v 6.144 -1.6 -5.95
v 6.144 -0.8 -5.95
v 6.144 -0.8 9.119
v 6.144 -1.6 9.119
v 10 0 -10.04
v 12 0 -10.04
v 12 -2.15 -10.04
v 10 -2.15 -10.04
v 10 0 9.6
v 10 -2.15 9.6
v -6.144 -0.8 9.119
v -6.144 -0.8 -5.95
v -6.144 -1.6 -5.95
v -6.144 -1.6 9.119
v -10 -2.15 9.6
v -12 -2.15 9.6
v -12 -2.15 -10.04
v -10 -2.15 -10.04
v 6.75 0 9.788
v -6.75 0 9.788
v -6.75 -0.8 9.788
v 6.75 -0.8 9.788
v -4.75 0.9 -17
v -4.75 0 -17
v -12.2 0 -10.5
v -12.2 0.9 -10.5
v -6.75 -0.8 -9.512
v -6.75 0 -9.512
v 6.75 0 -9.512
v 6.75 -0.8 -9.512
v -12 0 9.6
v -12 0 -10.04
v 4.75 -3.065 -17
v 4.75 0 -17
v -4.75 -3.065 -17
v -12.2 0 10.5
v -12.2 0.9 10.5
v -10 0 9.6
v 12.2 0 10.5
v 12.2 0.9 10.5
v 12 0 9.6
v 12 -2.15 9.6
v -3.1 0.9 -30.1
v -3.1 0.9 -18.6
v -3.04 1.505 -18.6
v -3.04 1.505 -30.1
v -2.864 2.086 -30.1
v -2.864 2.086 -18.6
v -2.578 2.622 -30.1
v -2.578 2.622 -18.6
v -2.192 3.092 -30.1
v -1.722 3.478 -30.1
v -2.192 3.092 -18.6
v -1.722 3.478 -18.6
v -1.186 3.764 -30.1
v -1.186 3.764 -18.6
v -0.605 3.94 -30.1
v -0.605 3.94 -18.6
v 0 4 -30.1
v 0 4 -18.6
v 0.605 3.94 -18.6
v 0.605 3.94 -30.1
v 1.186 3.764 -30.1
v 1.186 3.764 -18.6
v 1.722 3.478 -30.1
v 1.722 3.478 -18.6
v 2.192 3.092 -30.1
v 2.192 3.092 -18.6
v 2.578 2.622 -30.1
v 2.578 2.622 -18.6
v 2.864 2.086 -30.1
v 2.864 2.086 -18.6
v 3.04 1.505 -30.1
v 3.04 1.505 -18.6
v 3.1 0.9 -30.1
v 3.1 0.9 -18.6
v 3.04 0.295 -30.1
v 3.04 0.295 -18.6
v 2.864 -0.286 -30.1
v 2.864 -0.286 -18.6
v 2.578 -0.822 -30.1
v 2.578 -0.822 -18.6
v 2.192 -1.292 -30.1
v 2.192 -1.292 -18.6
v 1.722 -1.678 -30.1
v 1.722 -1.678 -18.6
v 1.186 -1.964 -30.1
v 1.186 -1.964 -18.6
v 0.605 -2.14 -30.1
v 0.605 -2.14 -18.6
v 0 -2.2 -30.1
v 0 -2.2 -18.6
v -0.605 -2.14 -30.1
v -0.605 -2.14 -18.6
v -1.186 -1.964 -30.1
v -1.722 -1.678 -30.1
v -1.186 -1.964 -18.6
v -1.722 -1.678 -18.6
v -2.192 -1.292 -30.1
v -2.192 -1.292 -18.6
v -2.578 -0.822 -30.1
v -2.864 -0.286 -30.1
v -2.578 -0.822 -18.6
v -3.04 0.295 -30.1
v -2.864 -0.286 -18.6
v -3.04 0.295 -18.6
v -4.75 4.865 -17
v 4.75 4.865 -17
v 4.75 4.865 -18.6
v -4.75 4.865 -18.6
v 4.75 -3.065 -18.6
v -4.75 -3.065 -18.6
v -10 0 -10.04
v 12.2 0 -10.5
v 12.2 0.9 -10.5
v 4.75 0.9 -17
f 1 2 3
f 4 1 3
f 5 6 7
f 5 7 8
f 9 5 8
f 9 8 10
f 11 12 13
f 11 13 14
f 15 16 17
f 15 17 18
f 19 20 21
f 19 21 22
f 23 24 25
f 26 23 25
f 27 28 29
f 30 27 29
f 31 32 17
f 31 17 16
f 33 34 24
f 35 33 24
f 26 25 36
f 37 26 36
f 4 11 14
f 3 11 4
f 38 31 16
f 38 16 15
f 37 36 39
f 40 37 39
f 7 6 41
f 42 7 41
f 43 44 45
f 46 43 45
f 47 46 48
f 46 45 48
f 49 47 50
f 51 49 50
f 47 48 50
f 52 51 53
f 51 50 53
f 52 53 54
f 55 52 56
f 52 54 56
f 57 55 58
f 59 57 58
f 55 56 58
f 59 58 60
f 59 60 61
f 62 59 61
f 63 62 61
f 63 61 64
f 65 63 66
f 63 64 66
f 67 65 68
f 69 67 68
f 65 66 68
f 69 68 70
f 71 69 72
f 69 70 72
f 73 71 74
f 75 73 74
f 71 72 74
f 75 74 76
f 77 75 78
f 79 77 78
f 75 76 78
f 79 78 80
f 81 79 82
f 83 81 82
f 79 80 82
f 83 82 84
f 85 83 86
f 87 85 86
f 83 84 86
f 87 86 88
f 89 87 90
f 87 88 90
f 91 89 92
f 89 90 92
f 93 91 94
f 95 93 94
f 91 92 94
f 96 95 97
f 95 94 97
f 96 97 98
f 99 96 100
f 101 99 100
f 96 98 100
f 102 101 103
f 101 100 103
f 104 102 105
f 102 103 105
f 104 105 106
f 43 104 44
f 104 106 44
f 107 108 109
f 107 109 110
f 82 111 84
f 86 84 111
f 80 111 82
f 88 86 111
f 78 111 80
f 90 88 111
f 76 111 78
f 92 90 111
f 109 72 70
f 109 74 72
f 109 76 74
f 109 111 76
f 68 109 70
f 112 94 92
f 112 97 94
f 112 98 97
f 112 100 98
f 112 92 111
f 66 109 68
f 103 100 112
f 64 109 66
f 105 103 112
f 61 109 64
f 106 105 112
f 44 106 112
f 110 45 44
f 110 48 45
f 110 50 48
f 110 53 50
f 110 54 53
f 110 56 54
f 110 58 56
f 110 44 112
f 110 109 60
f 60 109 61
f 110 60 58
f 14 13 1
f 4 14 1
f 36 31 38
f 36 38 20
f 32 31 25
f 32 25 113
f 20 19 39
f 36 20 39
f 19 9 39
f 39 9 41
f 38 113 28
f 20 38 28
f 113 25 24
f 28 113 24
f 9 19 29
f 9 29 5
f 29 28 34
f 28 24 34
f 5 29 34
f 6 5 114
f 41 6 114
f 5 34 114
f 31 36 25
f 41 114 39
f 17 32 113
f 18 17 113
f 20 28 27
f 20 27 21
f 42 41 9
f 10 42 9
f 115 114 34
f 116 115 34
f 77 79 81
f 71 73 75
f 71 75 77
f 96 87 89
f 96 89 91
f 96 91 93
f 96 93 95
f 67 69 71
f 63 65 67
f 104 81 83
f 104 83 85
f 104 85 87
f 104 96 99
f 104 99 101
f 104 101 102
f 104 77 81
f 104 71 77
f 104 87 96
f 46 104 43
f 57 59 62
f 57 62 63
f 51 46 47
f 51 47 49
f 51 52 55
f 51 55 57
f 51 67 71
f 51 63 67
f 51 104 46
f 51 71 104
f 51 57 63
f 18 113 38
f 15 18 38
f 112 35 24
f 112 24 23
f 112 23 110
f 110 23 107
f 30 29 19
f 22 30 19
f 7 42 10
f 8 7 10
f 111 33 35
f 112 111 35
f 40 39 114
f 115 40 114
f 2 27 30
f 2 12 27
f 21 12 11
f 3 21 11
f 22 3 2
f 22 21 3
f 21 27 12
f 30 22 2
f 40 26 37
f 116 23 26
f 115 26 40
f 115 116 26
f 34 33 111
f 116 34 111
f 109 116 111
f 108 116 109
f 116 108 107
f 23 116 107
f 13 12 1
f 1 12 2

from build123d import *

# Parameters (mm, degrees)
BOSS_EXTRUDE1_DEPTH = 0.9
SKETCH2_W           = 9.5
SKETCH2_H           = 7.93
BOSS_EXTRUDE2_DEPTH = 1.6
SKETCH3_R           = 3.1
BOSS_EXTRUDE3_DEPTH = 11.5
SKETCH4_W           = 2
SKETCH4_H           = 19.64
BOSS_EXTRUDE4_DEPTH = 2.15
SKETCH5_W           = 13.5
SKETCH5_H           = 19.3
BOSS_EXTRUDE5_DEPTH = 0.8
SKETCH6_W           = 12.288283072
SKETCH6_H           = 15.069258514
BOSS_EXTRUDE6_DEPTH = 0.8


with BuildPart() as part:
    # Sketch1 → Boss-Extrude1 (new body)
    with BuildSketch(Plane(origin=(0, 0, 0), x_dir=(1, 0, 0), z_dir=(0, 1, 0))):
        Polygon((-12.2, 10.5), (-12.2, -10.5), (12.2, -10.5), (12.2, 10.5), (4.75, 17), (-4.75, 17), align=None)
    extrude(amount=BOSS_EXTRUDE1_DEPTH)

    # Sketch2 → Boss-Extrude2 (add)
    with BuildSketch(Plane(origin=(0, 0, -17), x_dir=(-1, 0, 0), z_dir=(0, 0, -1))):
        with Locations((0, 0.9)):
            Rectangle(SKETCH2_W, SKETCH2_H)
    extrude(amount=BOSS_EXTRUDE2_DEPTH)

    # Sketch3 → Boss-Extrude3 (add)
    with BuildSketch(Plane(origin=(0, 0, -18.6), x_dir=(-1, 0, 0), z_dir=(0, 0, -1))):
        with Locations((0, 0.9)):
            Circle(SKETCH3_R)
    extrude(amount=BOSS_EXTRUDE3_DEPTH)

    # Sketch4 → Boss-Extrude4 (add)
    with BuildSketch(Plane.XZ):
        with Locations((-11, -0.22)):
            Rectangle(SKETCH4_W, SKETCH4_H)
    boss_extrude4 = extrude(amount=BOSS_EXTRUDE4_DEPTH)

    # Mirror1: Boss-Extrude4 across plane
    add(boss_extrude4.mirror(Plane(origin=(0, 0, 0), x_dir=(0, 0, 1), z_dir=(1, 0, 0))))

    # Sketch5 → Boss-Extrude5 (add)
    with BuildSketch(Plane.XZ):
        with Locations((0, 0.137773352)):
            Rectangle(SKETCH5_W, SKETCH5_H)
    extrude(amount=BOSS_EXTRUDE5_DEPTH)

    # Sketch6 → Boss-Extrude6 (add)
    with BuildSketch(Plane.XZ.offset(0.8)):
        with Locations((0, 1.584615241)):
            Rectangle(SKETCH6_W, SKETCH6_H)
    extrude(amount=BOSS_EXTRUDE6_DEPTH)


solid = part.part
